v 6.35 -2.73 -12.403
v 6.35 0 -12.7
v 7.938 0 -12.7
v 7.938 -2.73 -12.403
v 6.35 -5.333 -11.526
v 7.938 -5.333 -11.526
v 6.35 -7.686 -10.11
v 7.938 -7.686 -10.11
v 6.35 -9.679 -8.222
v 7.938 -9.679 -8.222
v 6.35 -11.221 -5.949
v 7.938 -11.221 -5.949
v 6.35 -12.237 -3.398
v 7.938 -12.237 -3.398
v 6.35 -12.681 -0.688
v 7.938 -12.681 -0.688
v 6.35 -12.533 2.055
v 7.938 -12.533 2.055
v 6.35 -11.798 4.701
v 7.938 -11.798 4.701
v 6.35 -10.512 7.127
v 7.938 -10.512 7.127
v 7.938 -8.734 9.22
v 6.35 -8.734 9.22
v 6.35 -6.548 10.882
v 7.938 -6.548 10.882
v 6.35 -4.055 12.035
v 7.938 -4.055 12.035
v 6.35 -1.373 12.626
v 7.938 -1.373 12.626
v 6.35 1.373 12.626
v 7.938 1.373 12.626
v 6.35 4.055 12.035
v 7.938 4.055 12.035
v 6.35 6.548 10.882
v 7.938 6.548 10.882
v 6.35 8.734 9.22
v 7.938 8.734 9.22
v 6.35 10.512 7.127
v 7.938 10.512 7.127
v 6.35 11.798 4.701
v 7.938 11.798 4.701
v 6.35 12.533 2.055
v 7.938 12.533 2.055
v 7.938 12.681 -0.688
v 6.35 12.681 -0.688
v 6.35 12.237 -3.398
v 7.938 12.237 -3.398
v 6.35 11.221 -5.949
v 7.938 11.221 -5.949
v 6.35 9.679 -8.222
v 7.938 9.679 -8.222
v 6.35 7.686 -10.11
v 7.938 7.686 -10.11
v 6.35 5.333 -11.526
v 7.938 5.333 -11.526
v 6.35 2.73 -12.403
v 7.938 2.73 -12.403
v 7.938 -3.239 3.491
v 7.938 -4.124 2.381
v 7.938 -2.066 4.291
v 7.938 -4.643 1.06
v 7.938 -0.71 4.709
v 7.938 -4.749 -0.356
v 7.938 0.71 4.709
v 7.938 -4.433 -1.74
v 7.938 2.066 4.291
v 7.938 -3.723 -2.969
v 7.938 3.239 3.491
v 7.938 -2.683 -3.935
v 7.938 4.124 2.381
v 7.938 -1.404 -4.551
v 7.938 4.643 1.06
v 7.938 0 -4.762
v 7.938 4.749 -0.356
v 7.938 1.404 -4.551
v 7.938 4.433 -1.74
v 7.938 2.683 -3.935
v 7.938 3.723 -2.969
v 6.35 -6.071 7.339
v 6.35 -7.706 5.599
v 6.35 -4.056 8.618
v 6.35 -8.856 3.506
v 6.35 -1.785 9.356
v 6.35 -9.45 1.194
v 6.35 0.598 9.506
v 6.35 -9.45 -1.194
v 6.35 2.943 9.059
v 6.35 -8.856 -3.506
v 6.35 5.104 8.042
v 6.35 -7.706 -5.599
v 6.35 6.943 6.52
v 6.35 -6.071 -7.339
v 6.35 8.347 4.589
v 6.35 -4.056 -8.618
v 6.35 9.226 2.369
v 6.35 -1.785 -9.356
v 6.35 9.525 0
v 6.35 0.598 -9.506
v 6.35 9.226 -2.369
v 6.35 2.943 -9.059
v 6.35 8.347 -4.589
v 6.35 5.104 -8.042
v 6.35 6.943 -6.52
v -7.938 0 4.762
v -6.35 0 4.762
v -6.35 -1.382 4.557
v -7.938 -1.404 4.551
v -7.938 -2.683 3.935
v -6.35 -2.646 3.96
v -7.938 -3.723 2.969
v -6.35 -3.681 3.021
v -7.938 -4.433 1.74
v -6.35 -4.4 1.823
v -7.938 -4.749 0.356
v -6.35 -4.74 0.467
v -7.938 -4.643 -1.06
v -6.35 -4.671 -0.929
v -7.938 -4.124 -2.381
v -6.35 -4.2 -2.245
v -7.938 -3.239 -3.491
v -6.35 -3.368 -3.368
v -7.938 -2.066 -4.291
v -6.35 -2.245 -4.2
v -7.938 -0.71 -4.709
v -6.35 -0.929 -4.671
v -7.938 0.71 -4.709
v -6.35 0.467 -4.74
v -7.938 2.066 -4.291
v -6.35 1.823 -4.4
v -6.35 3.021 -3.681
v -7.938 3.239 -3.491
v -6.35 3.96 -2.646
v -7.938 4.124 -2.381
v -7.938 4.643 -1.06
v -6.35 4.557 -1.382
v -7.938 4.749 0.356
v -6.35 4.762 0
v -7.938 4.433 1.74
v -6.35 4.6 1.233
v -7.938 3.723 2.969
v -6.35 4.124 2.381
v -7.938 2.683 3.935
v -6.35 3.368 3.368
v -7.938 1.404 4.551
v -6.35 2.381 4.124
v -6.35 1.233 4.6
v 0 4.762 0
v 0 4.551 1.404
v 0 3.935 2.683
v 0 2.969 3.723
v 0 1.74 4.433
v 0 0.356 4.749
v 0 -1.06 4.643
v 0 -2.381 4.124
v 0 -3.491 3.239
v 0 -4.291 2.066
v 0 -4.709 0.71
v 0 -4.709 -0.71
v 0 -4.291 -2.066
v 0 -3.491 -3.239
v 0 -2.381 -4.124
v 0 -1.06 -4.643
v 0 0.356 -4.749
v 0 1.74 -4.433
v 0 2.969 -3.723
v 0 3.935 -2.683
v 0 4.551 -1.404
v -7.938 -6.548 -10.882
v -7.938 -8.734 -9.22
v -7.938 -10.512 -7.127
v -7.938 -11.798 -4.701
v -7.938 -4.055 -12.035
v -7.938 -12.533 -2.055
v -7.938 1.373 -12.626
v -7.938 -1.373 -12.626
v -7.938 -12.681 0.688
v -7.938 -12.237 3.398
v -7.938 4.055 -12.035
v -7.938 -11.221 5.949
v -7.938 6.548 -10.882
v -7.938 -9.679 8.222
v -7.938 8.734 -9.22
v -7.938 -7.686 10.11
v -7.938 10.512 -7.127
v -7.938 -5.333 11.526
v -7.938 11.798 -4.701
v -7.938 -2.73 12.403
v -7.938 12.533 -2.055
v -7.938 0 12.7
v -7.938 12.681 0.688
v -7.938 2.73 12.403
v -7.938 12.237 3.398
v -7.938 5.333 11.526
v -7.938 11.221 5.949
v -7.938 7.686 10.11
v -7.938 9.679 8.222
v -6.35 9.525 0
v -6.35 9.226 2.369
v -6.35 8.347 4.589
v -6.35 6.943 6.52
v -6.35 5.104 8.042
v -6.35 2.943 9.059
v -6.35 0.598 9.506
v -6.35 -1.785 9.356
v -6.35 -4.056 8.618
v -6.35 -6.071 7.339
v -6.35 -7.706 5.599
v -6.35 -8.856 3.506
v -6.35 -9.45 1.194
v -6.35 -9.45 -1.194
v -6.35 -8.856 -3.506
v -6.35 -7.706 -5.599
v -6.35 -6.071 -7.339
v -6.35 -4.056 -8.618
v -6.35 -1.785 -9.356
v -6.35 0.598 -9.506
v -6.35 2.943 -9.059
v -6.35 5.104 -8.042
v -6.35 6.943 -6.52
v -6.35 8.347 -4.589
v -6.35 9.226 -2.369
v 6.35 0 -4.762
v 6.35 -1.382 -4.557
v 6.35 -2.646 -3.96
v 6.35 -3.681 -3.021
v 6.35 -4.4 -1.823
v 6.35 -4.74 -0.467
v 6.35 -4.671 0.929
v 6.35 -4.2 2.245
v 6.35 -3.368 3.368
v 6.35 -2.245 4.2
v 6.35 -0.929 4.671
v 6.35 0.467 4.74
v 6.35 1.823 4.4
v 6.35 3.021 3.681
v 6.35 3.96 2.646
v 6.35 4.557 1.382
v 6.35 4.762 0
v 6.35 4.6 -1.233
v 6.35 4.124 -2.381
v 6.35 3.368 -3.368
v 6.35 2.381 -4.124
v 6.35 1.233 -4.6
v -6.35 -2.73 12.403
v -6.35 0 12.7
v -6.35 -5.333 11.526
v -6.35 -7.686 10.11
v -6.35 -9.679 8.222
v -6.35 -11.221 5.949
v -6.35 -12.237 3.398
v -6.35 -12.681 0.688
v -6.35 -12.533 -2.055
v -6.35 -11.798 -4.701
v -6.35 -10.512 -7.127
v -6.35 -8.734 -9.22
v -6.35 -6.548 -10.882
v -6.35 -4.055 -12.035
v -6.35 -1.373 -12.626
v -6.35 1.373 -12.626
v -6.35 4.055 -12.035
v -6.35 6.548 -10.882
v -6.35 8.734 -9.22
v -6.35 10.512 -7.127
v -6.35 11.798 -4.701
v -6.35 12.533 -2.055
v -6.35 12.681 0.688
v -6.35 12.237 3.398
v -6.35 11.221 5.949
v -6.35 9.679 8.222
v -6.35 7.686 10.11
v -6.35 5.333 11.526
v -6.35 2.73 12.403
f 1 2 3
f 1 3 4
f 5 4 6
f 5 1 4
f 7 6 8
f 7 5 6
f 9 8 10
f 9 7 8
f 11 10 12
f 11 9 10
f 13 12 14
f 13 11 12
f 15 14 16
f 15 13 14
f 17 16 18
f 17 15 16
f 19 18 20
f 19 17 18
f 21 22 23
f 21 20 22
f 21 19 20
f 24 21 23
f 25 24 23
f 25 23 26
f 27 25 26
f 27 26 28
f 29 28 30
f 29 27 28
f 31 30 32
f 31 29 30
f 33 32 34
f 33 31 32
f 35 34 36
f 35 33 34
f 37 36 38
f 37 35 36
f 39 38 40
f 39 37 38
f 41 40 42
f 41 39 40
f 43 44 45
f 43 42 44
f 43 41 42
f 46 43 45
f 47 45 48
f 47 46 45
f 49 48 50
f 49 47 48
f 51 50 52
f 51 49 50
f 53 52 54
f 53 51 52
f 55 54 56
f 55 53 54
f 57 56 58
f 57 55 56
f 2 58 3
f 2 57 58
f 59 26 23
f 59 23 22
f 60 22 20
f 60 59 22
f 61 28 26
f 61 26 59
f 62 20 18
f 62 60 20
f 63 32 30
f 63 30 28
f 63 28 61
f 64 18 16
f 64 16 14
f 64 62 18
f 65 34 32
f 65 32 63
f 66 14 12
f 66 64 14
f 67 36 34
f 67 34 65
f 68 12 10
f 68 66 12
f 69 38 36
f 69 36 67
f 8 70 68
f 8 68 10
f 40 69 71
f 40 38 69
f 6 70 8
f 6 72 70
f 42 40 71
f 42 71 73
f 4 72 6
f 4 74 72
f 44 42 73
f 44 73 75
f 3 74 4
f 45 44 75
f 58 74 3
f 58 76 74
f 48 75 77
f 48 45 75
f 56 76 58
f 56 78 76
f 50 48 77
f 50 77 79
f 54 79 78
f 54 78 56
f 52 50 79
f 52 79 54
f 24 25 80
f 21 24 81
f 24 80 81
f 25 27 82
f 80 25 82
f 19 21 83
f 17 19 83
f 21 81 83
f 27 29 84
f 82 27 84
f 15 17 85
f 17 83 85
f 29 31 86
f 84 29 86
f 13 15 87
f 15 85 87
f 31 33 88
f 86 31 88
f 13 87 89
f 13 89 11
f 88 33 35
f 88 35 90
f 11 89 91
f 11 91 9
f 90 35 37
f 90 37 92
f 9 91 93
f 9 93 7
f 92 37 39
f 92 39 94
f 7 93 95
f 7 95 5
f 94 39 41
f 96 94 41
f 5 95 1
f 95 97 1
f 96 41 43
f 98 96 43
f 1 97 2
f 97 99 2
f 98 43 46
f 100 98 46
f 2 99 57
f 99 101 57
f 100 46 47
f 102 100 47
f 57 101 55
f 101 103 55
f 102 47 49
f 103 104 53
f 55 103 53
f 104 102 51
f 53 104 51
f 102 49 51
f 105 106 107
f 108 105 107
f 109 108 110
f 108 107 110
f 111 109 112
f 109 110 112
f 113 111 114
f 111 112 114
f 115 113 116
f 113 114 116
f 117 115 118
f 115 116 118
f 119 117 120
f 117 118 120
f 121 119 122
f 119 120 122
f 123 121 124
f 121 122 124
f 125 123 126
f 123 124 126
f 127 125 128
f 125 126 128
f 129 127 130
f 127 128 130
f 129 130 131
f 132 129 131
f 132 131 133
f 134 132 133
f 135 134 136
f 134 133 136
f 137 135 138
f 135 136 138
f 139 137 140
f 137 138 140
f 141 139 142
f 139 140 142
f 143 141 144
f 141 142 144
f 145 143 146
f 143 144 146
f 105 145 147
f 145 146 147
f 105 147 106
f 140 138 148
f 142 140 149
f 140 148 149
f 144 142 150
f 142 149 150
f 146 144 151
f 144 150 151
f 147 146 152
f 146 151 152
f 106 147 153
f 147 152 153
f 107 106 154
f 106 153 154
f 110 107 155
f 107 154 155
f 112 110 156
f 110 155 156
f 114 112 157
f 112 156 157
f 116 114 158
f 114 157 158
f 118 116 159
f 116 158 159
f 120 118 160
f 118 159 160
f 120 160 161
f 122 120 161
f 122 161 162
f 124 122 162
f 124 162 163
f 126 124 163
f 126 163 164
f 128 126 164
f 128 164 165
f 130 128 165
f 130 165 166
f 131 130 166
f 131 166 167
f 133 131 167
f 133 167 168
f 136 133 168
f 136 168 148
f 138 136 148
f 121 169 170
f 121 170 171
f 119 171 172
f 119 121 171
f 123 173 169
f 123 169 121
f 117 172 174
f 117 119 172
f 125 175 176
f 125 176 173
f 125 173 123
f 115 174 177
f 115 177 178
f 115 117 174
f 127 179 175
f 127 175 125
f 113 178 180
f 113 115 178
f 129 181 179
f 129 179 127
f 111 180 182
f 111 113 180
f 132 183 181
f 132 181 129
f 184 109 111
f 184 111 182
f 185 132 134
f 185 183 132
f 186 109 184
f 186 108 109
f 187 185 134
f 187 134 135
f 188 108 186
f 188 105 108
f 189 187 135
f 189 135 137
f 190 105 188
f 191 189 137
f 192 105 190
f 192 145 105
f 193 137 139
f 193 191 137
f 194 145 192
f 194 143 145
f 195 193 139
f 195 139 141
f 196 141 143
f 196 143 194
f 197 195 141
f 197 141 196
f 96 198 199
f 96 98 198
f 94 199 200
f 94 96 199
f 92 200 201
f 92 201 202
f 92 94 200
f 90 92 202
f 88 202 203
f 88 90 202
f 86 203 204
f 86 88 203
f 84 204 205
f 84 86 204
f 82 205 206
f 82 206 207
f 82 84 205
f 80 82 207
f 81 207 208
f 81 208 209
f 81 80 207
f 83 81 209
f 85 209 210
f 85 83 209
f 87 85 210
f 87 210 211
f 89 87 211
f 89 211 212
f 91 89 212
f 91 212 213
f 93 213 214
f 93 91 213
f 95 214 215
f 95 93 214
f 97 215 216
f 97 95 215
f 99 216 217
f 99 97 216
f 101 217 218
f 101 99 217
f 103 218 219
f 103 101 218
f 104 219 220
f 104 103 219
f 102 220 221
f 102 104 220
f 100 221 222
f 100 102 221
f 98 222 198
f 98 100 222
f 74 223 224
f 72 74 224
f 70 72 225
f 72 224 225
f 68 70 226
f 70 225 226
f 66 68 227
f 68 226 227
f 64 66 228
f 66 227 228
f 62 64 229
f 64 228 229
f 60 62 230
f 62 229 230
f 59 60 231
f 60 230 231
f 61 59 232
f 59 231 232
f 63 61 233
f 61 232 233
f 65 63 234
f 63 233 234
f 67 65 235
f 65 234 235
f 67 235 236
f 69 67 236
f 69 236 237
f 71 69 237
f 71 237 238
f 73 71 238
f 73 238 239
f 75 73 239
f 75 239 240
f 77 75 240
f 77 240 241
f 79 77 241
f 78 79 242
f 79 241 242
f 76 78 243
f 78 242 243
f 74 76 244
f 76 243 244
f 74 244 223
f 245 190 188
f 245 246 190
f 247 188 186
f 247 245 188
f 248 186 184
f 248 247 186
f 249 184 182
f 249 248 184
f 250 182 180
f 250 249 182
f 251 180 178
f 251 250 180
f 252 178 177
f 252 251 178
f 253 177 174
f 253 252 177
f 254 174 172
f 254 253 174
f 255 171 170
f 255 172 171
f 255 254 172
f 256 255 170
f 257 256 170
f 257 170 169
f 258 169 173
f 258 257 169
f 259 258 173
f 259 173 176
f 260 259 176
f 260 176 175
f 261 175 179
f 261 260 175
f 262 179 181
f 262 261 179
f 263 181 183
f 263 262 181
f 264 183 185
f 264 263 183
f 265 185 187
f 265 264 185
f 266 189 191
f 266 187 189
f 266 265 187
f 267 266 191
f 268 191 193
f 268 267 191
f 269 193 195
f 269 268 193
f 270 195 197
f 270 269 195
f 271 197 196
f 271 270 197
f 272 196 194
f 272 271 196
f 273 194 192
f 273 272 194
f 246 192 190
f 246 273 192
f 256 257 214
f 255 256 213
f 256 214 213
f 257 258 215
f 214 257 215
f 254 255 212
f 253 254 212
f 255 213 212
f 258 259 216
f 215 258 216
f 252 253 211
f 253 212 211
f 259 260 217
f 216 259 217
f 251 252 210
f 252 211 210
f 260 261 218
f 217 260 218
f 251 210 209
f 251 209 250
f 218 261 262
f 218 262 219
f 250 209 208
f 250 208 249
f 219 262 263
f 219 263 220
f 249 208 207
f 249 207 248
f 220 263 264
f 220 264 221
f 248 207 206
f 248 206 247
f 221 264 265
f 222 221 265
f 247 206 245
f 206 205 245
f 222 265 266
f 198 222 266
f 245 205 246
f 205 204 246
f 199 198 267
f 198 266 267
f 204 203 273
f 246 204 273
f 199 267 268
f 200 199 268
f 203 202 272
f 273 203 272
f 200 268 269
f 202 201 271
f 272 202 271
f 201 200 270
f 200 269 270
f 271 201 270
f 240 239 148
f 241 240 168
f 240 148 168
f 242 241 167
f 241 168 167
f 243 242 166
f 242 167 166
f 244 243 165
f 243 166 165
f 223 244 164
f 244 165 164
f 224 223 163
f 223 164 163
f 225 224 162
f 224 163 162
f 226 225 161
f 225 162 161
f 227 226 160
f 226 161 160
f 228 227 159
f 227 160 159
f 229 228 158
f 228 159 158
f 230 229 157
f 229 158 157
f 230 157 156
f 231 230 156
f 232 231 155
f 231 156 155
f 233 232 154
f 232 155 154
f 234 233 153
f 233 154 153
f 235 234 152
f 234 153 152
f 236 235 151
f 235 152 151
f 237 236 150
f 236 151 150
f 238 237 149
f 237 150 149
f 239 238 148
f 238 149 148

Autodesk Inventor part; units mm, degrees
ref_plane "YZ Plane" through (0, 0, 0) normal (1, 0, 0) x (0, 1, 0)
ref_plane "XZ Plane" through (0, 0, 0) normal (0, 1, 0) x (-1, 0, 0)
ref_plane "XY Plane" through (0, 0, 0) normal (0, 0, 1) x (1, 0, 0)
sketch "Sketch1" plane through (0, 0, 0) normal (1, 0, 0) x (0, 1, 0)
  circle A0 centre (0, 0) radius 9.525
  circle A1 centre (0, 0) radius 4.7625
  dimension "d0" = 19.05
  dimension "d2" = 9.525
extrude "Extrusion1" add sketch "Sketch1" along normal mid plane 12.7
sketch "Sketch2" plane through (6.35, 0, 0) normal (1, 0, 0) x (0, 0, -1)
  circle A0 centre (0, 0) radius 12.7
  circle A1 centre (0, 0) radius 9.525 construction
  circle A2 centre (0, 0) radius 4.7625 projected
  dimension "d6" = 3.175
extrude "Extrusion2" add sketch "Sketch2" along normal blind 1.5875
sketch "Sketch3" plane through (-6.35, 0, 0) normal (-1, 0, 0) x (0, 0, 1)
  circle A0 centre (0, 0) radius 12.7 projected
  circle A1 centre (0, 0) radius 4.7625 projected
extrude "Extrusion3" add sketch "Sketch3" along normal blind 1.5875
sketch "Sketch4" plane through (7.9375, 0, 0) normal (1, 0, 0) x (0, 0, -1)
  circle A0 centre (0, 0) radius 4.7625 projected
  circle A1 centre (0, 0) radius 9.525
  dimension "d11" = 4.7625
extrude "Extrusion4" [suppressed]
properties part number "pulley XL 1.25in" material "Nylon 6/6"
